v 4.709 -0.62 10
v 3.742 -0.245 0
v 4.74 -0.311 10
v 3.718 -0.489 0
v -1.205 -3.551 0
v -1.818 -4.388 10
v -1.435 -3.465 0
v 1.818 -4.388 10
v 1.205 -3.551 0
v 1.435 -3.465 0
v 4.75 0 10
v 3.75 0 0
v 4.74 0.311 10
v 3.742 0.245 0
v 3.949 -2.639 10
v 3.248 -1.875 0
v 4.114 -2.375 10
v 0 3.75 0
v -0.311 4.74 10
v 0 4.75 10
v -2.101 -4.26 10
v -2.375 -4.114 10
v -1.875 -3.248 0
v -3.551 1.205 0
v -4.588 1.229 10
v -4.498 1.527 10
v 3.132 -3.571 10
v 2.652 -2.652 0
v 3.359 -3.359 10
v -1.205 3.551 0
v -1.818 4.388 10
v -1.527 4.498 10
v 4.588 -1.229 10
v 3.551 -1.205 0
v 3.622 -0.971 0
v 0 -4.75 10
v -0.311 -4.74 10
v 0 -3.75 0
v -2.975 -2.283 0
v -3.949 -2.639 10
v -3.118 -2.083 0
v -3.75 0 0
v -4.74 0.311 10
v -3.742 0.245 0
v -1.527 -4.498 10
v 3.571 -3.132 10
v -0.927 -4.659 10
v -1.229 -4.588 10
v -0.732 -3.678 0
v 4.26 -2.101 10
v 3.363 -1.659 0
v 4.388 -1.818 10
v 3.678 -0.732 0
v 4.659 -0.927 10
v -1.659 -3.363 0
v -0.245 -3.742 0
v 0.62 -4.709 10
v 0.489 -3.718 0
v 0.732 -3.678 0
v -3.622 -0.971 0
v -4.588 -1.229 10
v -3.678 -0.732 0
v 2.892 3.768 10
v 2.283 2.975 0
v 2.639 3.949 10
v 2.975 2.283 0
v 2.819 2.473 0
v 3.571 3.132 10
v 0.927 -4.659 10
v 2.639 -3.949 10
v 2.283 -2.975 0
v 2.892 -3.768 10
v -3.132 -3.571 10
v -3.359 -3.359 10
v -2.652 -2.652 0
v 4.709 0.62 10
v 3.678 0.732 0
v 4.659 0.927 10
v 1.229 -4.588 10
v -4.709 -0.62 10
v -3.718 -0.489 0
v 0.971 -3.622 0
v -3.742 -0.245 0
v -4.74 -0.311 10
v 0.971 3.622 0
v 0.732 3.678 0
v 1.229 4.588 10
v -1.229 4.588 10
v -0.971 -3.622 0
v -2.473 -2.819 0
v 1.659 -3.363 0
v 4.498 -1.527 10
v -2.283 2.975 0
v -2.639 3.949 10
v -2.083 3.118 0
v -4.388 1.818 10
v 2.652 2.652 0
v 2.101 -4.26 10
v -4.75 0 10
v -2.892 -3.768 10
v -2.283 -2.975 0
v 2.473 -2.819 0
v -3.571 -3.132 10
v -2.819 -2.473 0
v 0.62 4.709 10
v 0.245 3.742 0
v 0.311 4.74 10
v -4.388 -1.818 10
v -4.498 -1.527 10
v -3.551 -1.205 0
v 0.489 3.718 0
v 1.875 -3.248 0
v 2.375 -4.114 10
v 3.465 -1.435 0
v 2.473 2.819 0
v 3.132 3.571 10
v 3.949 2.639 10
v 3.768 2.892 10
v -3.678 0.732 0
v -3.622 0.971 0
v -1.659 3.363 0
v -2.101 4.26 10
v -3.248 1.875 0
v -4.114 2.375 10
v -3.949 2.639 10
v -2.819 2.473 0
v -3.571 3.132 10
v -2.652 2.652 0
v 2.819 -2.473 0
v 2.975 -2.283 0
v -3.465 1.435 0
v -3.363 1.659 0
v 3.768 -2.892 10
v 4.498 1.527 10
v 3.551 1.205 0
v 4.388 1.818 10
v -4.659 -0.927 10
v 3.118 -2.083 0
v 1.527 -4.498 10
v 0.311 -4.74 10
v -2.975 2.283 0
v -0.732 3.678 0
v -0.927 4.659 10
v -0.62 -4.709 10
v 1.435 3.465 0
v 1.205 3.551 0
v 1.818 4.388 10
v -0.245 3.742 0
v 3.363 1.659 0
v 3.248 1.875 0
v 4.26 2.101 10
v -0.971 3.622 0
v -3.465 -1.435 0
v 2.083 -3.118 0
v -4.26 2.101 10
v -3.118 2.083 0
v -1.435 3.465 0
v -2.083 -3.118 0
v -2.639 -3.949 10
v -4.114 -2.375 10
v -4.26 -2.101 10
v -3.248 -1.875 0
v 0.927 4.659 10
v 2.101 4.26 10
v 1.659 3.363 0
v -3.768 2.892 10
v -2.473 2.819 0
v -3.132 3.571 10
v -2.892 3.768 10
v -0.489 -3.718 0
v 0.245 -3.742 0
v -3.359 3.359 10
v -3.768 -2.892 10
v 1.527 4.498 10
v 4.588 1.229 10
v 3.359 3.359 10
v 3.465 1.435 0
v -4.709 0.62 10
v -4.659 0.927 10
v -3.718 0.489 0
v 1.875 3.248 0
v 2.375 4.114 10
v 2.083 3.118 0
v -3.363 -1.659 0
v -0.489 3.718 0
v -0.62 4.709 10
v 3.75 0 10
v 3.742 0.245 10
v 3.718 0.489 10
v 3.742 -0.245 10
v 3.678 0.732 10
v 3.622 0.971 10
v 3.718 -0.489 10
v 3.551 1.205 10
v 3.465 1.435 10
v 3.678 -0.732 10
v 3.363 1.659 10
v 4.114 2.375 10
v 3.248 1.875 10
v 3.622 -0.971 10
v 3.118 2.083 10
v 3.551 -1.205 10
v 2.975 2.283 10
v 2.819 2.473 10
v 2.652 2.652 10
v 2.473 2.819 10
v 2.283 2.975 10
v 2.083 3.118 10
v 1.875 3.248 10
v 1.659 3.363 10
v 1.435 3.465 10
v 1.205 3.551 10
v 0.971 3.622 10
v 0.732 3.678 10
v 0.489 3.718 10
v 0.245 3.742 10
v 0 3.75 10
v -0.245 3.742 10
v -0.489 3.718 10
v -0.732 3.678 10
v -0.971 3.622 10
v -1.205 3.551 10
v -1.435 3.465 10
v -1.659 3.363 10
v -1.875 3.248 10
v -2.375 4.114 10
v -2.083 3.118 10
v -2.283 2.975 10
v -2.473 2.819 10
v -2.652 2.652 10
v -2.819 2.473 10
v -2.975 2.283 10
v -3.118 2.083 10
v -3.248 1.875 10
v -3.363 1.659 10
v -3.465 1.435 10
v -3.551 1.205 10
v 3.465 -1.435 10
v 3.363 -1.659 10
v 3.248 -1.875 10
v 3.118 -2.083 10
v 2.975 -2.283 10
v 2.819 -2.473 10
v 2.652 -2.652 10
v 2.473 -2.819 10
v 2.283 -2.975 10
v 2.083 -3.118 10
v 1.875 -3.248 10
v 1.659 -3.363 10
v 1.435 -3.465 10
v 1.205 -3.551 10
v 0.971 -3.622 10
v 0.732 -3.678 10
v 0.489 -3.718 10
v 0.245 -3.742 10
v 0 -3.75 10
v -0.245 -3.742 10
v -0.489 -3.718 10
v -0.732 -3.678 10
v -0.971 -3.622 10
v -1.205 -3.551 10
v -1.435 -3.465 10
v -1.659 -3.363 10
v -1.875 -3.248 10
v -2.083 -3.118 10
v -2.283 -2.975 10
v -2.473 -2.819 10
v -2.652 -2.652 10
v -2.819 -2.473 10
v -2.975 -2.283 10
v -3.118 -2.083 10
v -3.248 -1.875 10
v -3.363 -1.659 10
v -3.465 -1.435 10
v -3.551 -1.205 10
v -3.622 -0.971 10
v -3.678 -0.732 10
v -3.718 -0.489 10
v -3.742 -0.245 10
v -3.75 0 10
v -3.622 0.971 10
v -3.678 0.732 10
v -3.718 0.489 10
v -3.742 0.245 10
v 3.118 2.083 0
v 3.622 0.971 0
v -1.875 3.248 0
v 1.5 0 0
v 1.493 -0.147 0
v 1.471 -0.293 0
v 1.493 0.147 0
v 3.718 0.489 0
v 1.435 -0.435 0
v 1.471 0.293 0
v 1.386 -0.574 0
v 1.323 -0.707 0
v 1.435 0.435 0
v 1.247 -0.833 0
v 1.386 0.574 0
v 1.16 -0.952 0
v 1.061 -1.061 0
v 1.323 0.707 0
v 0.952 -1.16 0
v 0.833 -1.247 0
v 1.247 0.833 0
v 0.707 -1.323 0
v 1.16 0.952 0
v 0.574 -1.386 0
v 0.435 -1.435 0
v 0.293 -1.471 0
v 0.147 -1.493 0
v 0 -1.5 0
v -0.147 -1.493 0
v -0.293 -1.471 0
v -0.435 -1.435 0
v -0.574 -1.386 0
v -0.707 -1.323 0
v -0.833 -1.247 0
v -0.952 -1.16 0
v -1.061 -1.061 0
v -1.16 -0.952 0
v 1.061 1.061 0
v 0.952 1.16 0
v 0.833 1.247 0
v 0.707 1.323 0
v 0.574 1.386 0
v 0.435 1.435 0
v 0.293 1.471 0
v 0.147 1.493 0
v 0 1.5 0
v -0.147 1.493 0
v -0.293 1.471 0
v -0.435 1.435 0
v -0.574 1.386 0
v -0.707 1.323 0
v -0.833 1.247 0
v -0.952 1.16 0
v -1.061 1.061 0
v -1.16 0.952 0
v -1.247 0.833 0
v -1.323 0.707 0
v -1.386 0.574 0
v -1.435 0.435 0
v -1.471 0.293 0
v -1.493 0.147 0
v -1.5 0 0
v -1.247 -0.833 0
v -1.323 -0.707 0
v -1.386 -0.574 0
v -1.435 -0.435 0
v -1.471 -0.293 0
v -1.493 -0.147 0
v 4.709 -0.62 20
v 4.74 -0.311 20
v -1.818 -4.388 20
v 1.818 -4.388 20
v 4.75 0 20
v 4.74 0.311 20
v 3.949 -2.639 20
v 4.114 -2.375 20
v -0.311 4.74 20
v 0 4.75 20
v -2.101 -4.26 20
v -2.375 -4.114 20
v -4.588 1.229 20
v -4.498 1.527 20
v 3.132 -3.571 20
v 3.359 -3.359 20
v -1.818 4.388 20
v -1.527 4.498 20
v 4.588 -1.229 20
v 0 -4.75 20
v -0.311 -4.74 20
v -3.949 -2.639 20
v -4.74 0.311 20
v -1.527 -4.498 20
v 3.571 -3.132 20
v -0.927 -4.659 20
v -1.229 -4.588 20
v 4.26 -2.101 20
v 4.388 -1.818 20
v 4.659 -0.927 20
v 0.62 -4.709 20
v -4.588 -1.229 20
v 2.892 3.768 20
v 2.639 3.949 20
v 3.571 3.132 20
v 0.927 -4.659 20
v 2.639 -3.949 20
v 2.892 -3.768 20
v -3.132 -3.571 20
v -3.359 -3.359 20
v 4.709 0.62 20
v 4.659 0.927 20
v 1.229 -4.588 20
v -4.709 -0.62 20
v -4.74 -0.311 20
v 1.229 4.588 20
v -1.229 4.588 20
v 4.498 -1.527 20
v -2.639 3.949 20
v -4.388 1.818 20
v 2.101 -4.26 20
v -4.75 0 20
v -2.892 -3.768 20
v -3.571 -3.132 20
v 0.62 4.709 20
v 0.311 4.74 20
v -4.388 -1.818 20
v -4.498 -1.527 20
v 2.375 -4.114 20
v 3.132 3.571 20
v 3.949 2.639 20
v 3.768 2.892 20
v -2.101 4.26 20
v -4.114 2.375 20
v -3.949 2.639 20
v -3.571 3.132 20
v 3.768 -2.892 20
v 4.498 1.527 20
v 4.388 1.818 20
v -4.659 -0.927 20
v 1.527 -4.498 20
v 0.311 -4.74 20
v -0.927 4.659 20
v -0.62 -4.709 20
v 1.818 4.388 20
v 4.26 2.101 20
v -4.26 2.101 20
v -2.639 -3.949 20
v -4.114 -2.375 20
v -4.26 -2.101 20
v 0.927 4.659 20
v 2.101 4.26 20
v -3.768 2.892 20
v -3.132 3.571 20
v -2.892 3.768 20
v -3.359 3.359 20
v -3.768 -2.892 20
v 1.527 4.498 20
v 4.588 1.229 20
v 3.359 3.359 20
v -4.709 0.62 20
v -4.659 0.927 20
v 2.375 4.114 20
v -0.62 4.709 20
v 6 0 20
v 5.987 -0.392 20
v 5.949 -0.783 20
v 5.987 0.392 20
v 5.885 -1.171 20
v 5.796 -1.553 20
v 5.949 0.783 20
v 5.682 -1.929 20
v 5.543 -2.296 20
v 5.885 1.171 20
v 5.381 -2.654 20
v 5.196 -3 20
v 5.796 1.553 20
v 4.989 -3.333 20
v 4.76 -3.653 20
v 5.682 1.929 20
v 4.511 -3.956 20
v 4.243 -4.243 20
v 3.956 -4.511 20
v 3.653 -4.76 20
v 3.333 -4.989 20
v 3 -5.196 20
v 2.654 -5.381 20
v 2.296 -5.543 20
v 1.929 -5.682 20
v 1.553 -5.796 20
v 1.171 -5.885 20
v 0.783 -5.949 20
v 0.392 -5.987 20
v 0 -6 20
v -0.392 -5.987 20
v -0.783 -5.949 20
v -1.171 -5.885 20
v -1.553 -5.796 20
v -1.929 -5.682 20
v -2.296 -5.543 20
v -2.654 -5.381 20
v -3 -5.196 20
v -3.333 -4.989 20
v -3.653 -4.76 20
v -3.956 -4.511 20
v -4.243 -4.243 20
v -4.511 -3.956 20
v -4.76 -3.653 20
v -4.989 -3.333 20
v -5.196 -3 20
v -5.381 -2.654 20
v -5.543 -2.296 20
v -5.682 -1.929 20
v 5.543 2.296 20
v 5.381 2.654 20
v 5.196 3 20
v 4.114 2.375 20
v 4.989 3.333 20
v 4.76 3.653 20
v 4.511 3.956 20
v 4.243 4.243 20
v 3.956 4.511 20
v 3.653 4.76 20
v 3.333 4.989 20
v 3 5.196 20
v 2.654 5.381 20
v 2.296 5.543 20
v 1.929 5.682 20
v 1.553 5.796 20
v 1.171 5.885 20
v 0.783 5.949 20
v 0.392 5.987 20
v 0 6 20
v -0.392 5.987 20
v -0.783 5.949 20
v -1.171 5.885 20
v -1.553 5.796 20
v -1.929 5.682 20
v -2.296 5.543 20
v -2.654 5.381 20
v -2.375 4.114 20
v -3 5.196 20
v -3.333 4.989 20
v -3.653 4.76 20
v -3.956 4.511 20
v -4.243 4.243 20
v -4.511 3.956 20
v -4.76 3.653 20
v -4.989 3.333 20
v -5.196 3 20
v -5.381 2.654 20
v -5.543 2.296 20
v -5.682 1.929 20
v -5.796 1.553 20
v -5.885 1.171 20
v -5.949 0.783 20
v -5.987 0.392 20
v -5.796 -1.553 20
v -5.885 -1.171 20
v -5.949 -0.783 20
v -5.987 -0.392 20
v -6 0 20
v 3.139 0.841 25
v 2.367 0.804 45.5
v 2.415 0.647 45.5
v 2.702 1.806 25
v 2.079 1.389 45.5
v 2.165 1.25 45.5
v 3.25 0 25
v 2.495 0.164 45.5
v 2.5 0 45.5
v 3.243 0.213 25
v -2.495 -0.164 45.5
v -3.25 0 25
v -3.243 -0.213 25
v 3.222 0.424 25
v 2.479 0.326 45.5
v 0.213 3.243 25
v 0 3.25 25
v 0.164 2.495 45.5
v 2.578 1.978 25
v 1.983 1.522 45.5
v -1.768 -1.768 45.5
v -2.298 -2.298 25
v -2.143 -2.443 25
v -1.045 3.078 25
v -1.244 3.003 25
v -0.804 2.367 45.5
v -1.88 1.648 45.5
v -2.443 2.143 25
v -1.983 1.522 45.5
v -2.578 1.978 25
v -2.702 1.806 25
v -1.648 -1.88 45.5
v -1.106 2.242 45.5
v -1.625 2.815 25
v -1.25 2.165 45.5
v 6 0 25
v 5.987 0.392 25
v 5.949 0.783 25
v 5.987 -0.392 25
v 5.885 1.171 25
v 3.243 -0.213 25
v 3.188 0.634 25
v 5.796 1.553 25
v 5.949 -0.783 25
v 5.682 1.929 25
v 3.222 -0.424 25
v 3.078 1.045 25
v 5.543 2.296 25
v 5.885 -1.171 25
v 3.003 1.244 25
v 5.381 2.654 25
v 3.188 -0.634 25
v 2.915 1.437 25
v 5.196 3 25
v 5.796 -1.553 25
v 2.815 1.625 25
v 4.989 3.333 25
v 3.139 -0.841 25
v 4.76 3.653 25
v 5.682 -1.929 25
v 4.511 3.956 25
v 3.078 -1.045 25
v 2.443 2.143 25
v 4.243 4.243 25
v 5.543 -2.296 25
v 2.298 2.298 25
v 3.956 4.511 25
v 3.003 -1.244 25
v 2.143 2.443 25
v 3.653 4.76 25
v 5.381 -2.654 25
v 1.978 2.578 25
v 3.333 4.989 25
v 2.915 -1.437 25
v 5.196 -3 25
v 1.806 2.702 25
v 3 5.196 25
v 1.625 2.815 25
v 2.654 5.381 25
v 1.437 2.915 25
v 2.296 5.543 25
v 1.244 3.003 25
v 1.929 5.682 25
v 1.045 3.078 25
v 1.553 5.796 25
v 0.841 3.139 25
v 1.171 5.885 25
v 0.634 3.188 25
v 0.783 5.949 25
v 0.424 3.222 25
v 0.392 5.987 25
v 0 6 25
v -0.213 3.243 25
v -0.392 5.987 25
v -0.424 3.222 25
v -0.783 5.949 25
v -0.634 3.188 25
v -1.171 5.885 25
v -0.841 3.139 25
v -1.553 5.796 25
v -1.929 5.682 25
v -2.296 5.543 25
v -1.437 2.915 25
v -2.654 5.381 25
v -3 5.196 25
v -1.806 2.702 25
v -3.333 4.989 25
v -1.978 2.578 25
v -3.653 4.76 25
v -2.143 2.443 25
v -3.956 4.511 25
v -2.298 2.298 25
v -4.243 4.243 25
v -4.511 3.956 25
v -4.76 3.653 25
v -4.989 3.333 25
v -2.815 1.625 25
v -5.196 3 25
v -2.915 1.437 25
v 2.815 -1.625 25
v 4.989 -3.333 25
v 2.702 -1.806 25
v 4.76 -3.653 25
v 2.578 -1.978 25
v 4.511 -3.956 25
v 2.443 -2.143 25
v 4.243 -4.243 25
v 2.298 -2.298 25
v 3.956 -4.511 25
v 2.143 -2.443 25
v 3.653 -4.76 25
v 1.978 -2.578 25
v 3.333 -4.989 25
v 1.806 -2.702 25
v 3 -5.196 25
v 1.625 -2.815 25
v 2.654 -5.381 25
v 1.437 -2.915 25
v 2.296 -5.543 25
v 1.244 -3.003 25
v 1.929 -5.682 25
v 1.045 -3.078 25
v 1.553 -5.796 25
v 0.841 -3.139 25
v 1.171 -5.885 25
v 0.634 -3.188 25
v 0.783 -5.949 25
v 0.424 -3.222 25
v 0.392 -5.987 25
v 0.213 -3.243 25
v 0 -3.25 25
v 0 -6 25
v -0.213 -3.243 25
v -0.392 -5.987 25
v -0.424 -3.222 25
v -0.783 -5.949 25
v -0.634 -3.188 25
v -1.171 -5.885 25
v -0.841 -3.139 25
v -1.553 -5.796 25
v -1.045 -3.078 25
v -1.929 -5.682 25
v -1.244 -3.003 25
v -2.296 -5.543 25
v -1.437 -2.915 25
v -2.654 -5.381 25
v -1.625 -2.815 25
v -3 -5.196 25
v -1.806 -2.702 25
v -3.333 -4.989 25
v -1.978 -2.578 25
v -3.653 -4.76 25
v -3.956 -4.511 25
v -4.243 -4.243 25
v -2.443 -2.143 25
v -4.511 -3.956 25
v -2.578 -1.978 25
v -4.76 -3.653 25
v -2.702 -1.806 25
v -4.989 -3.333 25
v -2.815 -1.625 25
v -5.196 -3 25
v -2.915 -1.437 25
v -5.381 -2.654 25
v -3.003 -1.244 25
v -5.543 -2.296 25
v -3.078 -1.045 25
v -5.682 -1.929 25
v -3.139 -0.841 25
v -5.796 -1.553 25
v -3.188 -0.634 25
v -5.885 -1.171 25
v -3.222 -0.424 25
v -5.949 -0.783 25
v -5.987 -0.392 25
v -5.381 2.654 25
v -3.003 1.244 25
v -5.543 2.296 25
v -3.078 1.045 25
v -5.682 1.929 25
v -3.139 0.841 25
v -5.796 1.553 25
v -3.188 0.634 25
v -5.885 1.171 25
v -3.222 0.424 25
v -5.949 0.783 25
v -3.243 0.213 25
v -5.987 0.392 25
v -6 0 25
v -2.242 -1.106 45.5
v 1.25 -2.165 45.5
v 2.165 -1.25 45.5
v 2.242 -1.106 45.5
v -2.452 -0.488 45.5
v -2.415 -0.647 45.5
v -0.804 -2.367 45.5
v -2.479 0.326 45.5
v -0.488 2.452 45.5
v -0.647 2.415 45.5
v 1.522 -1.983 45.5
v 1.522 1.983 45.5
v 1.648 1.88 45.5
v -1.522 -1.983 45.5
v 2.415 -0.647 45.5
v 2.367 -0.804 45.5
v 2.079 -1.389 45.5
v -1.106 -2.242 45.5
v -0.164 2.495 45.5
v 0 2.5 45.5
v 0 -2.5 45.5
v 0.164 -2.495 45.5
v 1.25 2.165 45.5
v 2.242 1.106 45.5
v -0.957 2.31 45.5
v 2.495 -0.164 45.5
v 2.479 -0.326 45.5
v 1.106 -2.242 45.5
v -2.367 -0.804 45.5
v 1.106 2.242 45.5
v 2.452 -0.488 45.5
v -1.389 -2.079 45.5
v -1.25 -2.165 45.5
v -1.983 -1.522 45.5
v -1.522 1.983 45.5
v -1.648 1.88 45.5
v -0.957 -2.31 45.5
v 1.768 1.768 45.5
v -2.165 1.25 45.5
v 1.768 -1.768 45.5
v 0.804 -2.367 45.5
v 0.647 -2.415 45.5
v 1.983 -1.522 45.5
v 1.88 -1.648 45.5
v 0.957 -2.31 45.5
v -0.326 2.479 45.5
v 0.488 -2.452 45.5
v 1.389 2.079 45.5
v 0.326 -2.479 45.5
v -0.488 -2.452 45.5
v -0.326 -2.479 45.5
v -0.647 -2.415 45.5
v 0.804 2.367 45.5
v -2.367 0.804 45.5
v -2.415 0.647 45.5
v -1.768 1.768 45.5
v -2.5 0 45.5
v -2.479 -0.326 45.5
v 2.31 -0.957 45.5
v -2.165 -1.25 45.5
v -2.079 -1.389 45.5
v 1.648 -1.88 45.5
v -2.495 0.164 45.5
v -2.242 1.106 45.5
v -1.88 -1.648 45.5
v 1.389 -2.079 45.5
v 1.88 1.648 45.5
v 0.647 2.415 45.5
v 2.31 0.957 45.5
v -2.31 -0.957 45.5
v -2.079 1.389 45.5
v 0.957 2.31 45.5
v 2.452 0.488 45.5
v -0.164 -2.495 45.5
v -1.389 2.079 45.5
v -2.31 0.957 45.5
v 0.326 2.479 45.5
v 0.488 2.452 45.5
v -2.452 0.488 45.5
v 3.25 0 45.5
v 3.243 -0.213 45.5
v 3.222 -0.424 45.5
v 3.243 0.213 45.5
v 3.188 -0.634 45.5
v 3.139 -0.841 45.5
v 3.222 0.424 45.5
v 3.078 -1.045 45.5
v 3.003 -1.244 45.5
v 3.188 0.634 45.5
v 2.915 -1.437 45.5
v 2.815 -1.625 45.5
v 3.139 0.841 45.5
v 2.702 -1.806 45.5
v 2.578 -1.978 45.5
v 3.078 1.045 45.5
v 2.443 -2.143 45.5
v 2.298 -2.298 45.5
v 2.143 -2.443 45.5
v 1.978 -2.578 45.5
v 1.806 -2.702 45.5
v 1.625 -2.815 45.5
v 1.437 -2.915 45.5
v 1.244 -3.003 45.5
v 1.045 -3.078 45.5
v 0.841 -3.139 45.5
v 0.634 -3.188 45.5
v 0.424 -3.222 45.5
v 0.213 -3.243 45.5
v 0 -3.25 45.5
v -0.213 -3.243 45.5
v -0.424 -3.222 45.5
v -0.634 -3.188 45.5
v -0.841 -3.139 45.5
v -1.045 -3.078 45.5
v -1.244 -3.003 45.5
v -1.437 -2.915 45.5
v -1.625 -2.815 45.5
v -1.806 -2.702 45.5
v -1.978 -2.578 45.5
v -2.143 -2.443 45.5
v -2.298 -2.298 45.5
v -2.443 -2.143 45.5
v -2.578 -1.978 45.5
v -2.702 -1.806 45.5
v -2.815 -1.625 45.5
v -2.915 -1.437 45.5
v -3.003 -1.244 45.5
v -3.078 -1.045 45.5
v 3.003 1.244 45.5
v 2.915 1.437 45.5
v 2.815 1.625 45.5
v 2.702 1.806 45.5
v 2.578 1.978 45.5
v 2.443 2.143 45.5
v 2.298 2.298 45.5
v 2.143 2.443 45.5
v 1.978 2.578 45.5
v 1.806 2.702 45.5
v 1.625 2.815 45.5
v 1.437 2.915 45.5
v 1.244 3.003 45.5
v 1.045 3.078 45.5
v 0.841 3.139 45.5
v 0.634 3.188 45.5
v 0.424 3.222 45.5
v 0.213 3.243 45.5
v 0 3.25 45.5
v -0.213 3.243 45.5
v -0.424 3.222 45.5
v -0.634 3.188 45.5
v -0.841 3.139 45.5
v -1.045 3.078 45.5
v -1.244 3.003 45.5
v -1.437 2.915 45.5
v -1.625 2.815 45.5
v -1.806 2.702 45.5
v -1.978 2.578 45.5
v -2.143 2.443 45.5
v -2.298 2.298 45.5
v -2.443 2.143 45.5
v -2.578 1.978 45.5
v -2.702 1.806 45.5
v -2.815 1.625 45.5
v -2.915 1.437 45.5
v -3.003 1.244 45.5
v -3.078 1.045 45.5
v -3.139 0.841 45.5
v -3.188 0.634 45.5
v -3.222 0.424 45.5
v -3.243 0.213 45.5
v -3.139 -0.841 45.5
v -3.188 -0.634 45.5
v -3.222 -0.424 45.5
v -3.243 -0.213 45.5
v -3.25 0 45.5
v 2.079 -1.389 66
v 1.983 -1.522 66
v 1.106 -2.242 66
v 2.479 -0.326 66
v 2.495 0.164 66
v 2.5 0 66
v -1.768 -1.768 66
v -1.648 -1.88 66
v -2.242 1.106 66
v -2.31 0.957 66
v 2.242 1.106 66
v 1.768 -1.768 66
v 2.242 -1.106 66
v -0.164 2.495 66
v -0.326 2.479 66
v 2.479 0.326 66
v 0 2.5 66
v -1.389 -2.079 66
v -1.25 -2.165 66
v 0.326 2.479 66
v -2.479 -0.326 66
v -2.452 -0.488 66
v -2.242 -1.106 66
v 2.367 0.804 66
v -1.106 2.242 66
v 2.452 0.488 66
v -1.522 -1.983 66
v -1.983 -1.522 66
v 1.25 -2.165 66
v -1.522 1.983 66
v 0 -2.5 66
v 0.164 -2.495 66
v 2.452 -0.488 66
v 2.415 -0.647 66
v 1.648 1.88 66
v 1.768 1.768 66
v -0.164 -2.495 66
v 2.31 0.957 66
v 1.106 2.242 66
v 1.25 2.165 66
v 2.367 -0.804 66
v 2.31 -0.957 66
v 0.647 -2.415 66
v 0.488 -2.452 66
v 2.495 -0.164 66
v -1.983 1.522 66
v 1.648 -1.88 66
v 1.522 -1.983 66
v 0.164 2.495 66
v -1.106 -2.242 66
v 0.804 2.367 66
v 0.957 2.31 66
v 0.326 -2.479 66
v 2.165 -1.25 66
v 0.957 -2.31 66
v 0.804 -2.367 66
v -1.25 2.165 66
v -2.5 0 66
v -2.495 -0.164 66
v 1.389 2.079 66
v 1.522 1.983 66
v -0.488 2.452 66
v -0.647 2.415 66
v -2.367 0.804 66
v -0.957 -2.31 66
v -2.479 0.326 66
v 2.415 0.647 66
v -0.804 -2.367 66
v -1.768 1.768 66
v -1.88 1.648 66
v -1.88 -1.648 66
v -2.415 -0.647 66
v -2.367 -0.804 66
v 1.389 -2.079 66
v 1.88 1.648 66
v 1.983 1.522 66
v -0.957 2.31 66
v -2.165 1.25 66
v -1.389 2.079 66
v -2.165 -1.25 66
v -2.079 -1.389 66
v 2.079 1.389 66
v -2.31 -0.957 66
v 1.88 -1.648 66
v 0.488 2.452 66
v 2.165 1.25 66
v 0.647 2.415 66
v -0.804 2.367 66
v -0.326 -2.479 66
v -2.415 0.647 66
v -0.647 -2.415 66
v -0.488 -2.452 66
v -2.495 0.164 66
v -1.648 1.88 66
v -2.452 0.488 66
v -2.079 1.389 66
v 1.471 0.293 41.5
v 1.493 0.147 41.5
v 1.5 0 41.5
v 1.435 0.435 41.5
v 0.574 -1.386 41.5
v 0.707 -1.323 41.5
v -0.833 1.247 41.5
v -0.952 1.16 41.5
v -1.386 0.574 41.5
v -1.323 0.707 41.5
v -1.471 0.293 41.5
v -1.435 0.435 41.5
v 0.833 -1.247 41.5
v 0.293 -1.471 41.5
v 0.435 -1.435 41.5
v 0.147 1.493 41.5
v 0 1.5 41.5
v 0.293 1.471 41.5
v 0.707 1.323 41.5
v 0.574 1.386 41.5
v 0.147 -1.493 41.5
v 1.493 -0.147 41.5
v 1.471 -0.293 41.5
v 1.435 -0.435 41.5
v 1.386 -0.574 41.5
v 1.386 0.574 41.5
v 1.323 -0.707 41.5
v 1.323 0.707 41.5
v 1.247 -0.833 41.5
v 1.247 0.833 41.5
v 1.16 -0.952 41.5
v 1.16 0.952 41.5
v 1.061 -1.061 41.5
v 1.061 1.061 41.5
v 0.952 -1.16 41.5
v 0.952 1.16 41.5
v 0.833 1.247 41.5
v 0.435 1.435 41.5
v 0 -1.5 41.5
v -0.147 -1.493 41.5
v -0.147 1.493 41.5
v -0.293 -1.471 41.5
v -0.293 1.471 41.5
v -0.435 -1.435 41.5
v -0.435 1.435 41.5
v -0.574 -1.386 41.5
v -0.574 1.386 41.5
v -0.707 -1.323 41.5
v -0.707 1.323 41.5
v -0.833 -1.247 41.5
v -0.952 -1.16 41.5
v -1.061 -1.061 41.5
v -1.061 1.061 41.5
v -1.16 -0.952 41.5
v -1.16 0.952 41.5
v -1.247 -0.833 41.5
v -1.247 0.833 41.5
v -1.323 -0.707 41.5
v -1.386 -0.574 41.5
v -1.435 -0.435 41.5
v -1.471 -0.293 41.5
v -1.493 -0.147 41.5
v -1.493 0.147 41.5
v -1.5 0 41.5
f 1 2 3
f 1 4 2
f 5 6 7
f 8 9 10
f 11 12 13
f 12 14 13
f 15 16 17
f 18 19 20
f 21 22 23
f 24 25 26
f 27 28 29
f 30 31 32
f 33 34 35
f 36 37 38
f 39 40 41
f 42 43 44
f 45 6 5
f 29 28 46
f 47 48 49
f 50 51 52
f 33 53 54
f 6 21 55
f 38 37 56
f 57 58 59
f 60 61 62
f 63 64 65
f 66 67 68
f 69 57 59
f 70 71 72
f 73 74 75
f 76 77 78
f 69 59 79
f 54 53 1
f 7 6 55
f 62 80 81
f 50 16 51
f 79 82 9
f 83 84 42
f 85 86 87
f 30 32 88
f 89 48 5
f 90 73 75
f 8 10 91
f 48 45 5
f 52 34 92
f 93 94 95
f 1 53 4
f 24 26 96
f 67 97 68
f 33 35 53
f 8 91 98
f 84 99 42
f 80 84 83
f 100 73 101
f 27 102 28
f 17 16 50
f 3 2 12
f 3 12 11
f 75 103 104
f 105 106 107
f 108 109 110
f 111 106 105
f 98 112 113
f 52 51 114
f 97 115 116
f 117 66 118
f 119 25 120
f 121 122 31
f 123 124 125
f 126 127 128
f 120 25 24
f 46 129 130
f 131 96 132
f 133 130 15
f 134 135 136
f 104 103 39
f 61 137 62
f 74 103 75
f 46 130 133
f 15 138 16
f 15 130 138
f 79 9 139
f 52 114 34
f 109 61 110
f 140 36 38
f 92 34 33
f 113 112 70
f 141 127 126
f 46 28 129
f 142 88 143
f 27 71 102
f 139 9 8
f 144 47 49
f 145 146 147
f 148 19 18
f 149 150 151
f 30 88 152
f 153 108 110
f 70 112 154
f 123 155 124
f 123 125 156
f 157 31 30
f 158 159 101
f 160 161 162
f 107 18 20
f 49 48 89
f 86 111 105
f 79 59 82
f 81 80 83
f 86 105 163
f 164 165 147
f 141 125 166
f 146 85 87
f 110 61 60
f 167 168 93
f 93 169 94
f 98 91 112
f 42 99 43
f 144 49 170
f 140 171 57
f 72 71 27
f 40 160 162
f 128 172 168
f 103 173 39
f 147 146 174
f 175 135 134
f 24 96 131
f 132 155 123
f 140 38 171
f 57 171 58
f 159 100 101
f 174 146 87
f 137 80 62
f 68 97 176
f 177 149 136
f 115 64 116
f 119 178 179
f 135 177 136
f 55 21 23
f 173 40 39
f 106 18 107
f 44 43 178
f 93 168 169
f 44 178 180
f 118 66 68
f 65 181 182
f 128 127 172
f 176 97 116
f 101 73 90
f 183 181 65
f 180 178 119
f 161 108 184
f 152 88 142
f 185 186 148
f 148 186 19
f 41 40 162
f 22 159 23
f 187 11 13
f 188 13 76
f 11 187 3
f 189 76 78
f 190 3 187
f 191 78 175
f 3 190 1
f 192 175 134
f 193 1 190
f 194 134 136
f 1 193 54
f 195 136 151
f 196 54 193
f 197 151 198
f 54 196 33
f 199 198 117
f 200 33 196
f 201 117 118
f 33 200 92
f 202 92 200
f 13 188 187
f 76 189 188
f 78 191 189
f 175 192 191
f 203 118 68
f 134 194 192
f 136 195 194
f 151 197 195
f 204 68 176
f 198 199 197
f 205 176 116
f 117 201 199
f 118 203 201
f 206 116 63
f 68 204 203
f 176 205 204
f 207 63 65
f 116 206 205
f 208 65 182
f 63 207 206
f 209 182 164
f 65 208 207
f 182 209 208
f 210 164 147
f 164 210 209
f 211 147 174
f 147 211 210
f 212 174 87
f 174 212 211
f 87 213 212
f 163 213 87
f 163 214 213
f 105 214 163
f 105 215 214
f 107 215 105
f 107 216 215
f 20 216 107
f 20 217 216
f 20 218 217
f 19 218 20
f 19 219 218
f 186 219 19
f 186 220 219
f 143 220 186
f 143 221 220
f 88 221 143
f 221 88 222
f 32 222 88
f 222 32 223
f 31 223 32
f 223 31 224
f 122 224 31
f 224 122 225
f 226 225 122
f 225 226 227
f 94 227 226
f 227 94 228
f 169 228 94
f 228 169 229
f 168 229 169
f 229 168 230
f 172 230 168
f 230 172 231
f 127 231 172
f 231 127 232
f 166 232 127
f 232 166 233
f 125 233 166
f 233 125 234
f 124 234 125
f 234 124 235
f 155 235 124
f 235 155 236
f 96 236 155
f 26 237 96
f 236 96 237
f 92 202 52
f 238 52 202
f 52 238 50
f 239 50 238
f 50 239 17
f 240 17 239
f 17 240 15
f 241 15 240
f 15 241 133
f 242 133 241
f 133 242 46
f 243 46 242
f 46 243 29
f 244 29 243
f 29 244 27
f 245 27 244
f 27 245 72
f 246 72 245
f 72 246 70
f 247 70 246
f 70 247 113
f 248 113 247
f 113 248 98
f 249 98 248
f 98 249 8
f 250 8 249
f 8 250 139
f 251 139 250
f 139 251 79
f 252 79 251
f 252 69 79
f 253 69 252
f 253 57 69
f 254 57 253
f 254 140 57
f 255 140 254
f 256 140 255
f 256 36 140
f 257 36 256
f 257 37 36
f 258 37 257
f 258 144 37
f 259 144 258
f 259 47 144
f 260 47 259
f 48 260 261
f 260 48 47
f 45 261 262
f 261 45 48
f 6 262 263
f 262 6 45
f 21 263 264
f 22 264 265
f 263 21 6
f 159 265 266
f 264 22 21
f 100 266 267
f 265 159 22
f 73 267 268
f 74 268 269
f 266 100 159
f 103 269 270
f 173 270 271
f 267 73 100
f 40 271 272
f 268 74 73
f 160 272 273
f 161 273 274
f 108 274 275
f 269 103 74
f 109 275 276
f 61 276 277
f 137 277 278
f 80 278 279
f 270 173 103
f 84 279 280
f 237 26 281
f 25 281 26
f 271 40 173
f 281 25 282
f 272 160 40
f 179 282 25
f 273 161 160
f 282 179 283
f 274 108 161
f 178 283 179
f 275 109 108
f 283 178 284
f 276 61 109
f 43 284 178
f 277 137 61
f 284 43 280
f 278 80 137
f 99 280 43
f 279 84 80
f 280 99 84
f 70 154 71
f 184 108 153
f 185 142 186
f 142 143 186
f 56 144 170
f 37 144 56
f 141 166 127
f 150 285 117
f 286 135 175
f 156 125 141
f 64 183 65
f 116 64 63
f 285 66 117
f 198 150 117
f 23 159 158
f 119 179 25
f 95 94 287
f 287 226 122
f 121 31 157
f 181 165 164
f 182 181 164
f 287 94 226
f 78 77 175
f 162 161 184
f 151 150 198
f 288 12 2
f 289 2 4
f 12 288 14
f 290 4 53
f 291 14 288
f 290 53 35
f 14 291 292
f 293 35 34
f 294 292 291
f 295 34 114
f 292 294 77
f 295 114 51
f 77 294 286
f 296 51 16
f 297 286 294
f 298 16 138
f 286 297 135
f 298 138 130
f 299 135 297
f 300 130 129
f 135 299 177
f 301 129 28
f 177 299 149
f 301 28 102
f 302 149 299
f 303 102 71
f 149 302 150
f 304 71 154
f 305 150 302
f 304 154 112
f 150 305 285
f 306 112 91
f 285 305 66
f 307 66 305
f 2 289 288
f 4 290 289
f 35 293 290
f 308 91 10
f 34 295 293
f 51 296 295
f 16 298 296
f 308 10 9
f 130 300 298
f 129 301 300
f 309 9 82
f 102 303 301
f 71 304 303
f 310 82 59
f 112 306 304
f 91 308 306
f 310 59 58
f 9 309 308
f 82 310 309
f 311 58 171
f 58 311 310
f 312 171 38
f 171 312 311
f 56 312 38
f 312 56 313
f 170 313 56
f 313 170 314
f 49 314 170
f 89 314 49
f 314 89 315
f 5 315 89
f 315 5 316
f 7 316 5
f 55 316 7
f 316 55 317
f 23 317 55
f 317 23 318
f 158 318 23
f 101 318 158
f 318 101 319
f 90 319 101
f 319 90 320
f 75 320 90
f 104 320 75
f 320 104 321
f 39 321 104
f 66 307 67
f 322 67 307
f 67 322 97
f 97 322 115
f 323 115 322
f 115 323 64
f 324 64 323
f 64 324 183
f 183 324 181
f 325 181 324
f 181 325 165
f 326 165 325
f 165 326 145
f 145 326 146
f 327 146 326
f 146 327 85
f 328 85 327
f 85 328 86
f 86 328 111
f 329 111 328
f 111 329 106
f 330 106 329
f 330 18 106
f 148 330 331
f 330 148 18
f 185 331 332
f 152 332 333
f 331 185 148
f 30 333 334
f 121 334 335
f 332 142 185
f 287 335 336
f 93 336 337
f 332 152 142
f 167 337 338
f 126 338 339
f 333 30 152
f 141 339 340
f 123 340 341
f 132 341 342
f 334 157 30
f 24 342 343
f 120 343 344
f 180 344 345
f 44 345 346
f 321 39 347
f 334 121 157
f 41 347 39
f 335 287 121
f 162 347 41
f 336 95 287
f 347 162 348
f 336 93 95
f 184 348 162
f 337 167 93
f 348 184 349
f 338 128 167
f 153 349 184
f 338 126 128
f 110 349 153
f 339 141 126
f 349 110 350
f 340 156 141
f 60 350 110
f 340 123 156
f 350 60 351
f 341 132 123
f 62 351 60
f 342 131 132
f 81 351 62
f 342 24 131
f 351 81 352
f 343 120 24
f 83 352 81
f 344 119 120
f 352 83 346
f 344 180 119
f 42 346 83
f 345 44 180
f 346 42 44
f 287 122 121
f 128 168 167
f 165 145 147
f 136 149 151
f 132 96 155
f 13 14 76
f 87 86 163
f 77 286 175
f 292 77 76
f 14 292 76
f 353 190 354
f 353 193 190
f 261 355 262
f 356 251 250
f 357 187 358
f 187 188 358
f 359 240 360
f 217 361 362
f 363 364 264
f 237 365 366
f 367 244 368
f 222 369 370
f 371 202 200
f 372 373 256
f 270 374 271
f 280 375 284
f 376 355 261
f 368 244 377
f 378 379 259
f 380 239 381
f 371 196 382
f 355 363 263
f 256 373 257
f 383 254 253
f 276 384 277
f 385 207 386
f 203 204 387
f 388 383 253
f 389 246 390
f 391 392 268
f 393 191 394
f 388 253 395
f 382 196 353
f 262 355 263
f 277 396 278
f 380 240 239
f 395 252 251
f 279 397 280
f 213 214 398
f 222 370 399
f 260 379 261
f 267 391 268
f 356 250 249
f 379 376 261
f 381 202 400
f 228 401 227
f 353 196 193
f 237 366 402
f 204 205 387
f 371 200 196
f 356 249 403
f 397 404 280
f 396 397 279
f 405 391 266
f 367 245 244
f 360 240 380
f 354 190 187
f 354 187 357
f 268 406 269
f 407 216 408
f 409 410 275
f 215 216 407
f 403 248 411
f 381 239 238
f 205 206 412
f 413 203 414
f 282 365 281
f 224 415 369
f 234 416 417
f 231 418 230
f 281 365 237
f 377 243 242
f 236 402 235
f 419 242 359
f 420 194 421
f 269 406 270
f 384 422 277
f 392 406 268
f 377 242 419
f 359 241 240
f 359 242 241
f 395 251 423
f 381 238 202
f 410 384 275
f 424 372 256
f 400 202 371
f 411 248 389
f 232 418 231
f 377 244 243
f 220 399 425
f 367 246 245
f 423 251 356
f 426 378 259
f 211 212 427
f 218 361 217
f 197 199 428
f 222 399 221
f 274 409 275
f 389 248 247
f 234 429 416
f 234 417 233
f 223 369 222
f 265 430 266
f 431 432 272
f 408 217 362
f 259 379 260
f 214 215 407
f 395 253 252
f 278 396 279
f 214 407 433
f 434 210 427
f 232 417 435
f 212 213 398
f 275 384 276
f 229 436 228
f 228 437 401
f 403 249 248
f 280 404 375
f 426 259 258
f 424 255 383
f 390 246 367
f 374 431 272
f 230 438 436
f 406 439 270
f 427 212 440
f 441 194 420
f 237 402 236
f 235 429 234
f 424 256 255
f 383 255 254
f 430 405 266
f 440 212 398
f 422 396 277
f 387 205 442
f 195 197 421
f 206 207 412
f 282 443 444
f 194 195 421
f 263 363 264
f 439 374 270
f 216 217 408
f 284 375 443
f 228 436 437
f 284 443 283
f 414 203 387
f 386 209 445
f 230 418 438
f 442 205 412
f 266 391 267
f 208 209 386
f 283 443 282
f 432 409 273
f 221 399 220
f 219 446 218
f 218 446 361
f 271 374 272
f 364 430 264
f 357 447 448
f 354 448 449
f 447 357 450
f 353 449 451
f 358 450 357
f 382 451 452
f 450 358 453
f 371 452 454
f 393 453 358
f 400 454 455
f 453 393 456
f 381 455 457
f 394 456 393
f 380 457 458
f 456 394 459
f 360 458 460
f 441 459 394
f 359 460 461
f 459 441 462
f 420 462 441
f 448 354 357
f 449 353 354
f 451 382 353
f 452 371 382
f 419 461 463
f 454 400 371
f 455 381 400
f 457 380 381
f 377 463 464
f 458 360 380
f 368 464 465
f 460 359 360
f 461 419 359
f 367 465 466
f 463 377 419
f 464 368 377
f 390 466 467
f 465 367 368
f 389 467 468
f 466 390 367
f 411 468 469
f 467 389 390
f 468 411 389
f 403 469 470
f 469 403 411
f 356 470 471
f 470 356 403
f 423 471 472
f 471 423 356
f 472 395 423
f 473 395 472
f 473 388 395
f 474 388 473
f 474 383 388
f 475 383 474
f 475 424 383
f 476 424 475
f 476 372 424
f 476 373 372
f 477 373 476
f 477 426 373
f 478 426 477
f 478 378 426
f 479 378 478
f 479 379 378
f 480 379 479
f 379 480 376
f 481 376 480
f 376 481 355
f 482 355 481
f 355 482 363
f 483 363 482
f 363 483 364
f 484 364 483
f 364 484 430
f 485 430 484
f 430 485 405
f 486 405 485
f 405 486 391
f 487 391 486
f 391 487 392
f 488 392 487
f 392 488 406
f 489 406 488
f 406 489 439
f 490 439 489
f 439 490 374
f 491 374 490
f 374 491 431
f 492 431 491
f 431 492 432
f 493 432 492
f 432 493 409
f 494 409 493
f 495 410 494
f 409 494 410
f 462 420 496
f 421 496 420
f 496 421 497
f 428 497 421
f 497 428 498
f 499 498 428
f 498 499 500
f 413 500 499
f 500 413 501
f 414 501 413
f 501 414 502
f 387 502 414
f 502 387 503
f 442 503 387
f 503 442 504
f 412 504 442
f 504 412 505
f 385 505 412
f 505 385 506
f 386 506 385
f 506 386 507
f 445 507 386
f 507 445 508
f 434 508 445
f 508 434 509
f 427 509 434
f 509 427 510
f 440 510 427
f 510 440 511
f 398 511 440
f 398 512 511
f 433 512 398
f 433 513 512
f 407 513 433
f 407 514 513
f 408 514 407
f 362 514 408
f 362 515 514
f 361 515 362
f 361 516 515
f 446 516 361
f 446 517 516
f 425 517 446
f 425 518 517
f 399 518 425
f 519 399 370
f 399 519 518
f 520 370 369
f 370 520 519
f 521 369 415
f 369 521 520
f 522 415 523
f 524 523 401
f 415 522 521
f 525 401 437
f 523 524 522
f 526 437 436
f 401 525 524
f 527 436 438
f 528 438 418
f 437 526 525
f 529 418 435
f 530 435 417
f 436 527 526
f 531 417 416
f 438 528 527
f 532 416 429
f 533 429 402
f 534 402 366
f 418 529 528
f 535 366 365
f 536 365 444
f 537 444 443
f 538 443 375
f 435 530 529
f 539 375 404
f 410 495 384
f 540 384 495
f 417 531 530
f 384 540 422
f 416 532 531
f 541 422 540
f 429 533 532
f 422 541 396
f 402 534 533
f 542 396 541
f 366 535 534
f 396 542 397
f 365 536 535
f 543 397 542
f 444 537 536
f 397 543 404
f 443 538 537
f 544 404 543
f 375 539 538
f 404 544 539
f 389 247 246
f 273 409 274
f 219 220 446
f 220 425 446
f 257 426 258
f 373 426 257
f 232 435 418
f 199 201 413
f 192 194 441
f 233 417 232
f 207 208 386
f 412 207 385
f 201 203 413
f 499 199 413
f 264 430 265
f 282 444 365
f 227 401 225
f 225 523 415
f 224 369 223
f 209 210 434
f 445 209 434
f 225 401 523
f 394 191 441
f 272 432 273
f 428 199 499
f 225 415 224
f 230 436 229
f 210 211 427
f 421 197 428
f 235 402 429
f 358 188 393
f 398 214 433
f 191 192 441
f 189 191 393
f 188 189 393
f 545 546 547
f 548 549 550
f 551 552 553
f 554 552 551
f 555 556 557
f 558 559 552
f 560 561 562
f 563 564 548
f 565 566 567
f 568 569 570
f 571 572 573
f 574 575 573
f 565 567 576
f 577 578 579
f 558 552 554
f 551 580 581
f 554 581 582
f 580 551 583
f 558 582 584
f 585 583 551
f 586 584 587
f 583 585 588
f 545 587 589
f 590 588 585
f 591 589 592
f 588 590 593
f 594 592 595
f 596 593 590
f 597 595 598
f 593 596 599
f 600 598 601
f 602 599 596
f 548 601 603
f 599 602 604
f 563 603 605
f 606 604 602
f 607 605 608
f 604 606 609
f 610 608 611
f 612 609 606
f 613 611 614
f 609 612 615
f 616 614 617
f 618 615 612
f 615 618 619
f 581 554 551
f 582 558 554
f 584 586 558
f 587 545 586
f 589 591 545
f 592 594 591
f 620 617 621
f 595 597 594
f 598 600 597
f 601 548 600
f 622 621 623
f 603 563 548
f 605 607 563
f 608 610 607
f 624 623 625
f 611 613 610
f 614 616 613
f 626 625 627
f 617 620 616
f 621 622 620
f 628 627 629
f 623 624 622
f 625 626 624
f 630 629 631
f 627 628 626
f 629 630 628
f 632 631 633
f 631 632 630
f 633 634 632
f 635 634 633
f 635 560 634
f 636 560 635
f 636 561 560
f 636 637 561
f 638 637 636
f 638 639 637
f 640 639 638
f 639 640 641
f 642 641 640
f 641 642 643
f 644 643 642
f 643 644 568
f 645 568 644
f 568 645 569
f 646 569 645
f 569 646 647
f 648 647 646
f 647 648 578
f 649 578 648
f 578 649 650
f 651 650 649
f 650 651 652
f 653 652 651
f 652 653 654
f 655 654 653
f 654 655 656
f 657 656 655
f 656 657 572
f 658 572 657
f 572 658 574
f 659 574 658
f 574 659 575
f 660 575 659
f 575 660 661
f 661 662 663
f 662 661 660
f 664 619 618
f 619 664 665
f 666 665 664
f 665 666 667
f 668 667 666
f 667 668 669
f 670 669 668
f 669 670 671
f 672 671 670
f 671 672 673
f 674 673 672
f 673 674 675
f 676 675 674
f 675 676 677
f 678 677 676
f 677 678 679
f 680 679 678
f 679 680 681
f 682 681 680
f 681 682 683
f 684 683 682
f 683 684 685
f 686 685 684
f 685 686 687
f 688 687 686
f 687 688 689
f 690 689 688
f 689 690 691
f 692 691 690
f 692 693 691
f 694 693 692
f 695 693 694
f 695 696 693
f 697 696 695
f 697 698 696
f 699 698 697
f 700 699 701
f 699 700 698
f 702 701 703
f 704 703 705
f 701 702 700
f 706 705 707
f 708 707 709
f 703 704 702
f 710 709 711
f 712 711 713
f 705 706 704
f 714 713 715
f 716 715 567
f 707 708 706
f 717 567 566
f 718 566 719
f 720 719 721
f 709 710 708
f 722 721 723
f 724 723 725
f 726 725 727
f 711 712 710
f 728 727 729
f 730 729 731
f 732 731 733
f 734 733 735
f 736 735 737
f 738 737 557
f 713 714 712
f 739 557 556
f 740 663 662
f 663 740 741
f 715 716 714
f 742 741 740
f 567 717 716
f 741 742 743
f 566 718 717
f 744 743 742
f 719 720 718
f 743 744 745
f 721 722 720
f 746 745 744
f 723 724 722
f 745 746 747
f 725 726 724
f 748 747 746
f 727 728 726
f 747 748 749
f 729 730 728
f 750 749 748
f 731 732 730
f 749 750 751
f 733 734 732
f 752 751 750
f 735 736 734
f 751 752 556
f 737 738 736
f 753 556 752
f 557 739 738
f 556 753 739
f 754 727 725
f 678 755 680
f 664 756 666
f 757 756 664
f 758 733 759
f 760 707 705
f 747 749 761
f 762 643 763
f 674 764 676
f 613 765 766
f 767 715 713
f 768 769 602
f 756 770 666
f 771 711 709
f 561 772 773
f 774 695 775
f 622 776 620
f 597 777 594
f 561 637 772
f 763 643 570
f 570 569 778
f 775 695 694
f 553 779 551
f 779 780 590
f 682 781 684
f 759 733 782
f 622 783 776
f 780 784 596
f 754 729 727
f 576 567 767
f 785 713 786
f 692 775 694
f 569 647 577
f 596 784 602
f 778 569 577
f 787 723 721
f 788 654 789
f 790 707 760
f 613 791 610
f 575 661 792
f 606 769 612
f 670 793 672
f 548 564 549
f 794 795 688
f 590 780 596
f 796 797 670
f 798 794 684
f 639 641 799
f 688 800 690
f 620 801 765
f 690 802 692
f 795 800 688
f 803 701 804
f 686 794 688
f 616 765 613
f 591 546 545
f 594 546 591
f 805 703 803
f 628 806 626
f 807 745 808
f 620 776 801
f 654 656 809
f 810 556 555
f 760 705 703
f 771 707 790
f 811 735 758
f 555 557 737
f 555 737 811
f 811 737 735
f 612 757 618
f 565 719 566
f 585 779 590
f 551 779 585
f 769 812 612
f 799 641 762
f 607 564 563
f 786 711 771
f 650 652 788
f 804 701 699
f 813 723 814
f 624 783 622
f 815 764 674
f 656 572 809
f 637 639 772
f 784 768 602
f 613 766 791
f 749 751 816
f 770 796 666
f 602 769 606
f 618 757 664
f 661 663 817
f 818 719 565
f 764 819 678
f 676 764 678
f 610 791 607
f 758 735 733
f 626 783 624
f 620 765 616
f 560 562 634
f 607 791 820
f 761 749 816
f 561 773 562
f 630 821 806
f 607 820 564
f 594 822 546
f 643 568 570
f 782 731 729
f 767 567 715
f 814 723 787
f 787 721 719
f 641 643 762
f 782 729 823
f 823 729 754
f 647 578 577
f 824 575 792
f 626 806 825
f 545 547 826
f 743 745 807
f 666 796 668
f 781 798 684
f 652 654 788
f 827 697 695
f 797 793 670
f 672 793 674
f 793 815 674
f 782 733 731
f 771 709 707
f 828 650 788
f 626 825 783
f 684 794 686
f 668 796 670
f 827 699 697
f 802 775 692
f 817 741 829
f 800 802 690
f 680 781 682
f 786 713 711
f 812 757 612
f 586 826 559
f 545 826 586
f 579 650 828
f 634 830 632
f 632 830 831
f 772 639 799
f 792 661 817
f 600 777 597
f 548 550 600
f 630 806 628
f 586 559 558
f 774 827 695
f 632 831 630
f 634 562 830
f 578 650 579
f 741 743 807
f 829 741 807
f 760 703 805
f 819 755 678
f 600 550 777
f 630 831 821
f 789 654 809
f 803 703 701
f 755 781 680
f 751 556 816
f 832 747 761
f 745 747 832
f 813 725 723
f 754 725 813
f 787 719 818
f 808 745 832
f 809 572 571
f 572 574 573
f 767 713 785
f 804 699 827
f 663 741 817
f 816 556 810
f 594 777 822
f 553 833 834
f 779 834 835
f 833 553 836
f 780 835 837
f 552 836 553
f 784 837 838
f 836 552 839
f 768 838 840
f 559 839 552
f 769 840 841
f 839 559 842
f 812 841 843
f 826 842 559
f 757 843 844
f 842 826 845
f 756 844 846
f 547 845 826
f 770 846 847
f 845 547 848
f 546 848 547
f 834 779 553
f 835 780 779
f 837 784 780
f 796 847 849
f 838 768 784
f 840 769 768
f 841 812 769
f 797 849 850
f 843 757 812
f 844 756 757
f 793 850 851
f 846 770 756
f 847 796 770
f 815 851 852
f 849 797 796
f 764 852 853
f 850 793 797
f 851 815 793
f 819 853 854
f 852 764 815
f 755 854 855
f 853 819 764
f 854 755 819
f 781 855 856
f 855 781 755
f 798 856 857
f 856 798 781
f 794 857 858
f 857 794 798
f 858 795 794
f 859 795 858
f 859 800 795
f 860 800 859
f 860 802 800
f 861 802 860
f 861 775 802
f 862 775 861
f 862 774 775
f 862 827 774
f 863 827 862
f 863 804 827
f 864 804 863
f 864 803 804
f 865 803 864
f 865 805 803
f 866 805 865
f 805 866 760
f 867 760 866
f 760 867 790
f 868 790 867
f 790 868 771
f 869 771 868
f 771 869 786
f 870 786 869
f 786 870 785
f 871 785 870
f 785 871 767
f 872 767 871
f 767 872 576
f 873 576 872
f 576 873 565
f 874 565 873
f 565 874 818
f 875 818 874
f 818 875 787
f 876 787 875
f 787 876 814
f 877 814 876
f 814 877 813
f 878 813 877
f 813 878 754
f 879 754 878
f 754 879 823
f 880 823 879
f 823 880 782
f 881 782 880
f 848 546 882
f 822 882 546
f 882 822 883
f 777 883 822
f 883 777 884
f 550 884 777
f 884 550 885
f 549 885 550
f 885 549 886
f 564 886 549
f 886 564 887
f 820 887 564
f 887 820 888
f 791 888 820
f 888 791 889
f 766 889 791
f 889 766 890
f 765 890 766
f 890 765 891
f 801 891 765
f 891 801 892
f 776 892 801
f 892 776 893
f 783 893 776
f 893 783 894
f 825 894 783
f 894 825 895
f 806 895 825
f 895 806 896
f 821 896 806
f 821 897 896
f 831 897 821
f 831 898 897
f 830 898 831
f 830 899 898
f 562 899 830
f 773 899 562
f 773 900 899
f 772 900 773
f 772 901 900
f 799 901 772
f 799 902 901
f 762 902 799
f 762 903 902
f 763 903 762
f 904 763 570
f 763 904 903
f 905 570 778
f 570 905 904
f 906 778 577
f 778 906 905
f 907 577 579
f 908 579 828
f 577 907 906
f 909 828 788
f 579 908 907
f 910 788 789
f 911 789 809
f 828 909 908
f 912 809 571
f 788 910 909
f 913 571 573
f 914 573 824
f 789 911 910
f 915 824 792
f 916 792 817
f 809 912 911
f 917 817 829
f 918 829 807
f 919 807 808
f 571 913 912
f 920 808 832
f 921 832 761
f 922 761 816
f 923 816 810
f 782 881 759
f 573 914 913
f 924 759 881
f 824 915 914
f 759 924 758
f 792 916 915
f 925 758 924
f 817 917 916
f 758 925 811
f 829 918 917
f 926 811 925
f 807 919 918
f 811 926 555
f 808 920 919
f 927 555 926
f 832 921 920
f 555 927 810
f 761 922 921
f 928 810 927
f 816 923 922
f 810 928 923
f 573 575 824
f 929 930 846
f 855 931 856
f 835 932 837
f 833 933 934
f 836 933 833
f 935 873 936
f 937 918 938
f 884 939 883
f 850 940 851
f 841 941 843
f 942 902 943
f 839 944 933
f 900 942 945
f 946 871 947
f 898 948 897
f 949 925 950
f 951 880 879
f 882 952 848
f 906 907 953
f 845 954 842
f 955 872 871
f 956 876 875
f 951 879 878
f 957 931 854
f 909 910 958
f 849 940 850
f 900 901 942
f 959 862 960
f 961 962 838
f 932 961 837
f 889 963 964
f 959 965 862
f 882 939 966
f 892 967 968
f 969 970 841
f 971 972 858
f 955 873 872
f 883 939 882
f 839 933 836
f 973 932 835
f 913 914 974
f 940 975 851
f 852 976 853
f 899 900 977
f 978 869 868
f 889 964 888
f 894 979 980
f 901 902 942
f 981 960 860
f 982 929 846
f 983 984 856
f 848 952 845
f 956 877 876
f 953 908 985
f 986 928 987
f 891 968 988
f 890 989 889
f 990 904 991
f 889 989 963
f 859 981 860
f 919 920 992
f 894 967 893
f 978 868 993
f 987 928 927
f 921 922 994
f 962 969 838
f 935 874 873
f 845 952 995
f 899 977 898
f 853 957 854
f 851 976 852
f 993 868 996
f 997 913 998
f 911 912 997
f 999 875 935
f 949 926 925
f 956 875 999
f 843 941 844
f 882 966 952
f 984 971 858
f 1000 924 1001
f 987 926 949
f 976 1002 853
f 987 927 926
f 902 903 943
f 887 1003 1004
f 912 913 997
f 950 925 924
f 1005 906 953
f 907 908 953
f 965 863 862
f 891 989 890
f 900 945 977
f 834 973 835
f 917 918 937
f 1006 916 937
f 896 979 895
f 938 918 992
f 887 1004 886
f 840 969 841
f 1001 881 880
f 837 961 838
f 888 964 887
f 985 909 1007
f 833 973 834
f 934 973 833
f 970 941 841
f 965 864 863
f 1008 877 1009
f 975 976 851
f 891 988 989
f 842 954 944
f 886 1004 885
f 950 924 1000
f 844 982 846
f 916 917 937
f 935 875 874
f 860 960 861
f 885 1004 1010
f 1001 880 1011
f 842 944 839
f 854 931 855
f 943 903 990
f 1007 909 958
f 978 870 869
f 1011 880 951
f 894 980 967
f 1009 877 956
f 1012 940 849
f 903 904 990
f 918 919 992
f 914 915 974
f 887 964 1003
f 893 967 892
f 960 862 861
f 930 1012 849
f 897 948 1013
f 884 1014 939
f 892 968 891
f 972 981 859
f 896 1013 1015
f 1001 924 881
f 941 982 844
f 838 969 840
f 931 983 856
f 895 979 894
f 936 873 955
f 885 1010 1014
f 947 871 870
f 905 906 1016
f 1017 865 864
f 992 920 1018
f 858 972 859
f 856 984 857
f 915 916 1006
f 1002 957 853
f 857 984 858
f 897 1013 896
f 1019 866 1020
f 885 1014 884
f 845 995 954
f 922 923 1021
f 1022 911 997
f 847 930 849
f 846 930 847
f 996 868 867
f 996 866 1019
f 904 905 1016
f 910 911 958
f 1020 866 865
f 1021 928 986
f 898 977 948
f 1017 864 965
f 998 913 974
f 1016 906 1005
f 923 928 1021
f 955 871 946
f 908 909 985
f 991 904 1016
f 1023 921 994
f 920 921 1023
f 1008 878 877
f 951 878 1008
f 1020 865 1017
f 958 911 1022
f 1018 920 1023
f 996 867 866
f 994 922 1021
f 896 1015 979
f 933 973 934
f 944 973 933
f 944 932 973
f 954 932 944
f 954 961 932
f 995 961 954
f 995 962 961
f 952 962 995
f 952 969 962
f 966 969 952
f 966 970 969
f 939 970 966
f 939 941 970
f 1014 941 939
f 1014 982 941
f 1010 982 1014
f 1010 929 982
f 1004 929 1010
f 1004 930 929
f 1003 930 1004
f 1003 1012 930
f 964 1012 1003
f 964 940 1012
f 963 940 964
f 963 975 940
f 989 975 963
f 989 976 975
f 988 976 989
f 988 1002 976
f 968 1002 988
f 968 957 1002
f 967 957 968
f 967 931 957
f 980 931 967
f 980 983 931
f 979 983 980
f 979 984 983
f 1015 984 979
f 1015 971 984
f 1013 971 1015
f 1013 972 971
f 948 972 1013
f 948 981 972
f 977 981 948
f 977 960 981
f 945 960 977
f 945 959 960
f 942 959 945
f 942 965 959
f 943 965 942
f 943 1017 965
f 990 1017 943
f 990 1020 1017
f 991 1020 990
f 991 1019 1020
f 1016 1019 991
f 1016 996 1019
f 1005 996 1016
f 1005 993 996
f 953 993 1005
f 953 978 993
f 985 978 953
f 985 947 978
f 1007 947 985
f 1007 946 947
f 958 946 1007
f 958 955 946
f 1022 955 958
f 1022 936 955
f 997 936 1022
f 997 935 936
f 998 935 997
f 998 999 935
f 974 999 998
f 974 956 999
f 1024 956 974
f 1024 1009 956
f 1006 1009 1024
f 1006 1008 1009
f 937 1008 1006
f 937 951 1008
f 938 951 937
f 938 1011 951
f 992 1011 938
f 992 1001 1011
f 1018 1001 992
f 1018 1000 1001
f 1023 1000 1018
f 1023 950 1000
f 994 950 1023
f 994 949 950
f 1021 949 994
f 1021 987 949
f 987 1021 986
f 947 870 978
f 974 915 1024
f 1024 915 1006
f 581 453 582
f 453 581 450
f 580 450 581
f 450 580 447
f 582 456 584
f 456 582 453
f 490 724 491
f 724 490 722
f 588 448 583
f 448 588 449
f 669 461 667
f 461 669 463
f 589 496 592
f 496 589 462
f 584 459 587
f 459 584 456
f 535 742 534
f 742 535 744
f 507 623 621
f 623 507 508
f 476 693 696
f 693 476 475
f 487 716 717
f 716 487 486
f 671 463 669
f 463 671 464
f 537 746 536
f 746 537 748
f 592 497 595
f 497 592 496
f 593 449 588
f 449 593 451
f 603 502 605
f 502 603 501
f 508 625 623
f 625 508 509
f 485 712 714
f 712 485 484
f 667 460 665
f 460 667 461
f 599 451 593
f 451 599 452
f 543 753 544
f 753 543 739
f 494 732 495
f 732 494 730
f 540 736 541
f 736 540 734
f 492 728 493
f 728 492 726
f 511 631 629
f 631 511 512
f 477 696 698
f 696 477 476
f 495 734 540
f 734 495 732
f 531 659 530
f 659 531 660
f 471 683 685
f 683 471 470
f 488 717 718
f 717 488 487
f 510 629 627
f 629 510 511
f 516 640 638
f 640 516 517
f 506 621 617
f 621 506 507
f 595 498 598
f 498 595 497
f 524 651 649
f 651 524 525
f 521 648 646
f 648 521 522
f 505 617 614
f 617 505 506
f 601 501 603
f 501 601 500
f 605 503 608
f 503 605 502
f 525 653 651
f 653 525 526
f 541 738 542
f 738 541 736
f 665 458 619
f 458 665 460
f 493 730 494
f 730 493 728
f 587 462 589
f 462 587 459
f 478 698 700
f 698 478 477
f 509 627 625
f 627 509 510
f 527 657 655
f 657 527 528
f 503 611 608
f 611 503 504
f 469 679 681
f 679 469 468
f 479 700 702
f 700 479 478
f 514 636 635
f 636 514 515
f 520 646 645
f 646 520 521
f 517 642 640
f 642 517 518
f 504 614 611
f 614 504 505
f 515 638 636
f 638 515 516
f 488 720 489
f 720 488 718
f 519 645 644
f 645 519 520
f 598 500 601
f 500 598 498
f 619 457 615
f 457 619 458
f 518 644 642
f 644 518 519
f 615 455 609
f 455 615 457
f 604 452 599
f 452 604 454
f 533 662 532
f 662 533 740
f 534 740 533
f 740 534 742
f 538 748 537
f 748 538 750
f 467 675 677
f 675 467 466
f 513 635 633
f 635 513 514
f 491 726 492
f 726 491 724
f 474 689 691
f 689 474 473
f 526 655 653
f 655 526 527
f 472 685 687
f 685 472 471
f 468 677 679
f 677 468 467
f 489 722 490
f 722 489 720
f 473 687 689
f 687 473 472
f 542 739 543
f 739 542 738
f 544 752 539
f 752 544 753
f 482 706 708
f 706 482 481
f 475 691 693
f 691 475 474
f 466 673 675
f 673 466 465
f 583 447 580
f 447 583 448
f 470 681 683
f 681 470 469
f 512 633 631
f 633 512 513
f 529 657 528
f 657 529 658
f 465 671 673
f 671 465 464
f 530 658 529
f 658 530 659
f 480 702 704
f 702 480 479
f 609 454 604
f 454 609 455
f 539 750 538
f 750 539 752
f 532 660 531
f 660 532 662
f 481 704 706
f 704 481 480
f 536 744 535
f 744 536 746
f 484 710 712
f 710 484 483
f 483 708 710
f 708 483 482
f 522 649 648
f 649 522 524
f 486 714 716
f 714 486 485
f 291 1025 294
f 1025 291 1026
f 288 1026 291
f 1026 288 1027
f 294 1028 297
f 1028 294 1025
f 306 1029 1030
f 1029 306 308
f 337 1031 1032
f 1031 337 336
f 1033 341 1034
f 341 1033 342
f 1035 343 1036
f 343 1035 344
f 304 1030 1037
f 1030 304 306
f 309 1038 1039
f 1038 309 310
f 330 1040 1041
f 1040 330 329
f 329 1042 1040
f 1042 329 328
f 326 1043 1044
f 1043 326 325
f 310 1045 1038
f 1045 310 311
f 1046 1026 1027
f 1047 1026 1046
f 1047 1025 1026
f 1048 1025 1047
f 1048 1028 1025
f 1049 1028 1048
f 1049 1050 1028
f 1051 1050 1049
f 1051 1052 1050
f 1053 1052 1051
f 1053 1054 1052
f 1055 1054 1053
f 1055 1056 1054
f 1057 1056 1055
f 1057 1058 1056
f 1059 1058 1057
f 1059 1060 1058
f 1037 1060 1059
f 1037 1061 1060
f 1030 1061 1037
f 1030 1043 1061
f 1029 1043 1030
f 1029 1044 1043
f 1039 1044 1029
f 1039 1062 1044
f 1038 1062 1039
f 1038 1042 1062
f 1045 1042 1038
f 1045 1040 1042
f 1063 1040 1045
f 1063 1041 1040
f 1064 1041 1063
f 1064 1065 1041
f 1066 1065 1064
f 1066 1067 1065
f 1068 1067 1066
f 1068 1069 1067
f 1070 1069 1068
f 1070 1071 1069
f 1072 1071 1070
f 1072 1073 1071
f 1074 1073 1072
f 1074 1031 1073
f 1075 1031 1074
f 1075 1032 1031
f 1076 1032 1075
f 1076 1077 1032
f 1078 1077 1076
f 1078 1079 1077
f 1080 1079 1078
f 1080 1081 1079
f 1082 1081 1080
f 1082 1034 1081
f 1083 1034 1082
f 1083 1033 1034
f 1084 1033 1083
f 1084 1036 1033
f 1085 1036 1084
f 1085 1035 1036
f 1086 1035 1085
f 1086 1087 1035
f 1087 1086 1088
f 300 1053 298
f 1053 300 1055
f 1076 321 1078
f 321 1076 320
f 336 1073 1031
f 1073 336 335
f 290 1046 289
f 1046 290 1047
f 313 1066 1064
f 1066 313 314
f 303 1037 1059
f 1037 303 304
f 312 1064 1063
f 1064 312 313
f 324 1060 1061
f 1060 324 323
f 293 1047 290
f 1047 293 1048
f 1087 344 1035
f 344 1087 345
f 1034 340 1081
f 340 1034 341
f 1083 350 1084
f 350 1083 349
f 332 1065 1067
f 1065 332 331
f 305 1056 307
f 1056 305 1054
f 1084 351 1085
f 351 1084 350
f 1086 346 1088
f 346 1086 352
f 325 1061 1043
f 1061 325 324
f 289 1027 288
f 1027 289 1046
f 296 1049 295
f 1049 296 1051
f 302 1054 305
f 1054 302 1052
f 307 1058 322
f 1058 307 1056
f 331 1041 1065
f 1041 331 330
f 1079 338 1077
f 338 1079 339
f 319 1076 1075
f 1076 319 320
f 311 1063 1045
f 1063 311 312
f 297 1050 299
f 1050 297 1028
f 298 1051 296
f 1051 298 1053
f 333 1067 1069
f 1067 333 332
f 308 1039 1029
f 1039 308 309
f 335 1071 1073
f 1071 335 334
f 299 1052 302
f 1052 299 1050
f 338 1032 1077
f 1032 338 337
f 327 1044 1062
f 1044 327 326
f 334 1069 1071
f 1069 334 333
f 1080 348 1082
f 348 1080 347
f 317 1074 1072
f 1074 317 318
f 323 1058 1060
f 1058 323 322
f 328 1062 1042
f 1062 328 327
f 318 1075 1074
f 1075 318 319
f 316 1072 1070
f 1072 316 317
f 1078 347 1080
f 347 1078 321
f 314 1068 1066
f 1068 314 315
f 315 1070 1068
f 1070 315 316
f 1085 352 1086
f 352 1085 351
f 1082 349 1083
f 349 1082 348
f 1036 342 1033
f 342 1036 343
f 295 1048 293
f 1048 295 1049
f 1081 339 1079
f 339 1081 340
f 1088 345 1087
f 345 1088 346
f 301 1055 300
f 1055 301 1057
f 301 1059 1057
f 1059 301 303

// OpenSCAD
// Straight hose-barb reducer: 8 mm tubing (barbs) -> 5 mm tubing (barbs)
// Print orientation: standing upright along Z, centred on origin in X/Y

// ---------------- Parameters ----------------
bore      = 3;    // through-bore diameter (mm)
eps       = 0.5;  // cutter overshoot past faces (mm)

// Lower section (z = 0 .. 20): 8 mm tubing barbs
z_barb_a  = 20;   // height of lower barbs (mm)
d_barb_a  = 8;    // tubing inner diameter (mm)
d_barb_o  = 9.5;  // outer diameter at top of barb (mm)
d_barb_b  = 7.5;  // outer diameter at bottom of barb / after step (mm)

// Collar (z = 20 .. 25)
z_collar  = 5;    // collar height (mm)
d_collar  = 12;   // collar outer diameter (mm)

// Upper section (z = 25 .. 41): 5 mm tubing barbs
z_barb_c  = 41;   // top of upper barbs (mm)
d_barb_d  = 5;    // tubing inner diameter (mm)
d_barb_e  = 6.5;  // outer diameter at bottom of barb / after step (mm)
d_barb_f  = 5.0;  // outer diameter at top of barb (mm)

n_barbs   = 2;    // number of barbs, stacked

// ---------------- Model ----------------
difference() {
    union() {
        // Lower barbs
        for (i = [0 : n_barbs - 1]) {
            translate([0, 0, i * z_barb_a / n_barbs])
                cylinder(h = z_barb_a / n_barbs,
                         d1 = d_barb_b,
                         d2 = d_barb_o,
                         $fn = 96);
        }

        // Collar
        translate([0, 0, z_barb_a])
            cylinder(h = z_collar, d = d_collar, $fn = 96);

        // Upper barbs
        for (i = [0 : n_barbs - 1]) {
            translate([0, 0, z_barb_a + z_collar + i * z_barb_c / n_barbs])
                cylinder(h = z_barb_c / n_barbs,
                         d1 = d_barb_e,
                         d2 = d_barb_f,
                         $fn = 96);
        }
    }

    // Through-bore
    translate([0, 0, -eps])
        cylinder(h = z_barb_c + 2 * eps, d = bore, $fn = 64);
}
